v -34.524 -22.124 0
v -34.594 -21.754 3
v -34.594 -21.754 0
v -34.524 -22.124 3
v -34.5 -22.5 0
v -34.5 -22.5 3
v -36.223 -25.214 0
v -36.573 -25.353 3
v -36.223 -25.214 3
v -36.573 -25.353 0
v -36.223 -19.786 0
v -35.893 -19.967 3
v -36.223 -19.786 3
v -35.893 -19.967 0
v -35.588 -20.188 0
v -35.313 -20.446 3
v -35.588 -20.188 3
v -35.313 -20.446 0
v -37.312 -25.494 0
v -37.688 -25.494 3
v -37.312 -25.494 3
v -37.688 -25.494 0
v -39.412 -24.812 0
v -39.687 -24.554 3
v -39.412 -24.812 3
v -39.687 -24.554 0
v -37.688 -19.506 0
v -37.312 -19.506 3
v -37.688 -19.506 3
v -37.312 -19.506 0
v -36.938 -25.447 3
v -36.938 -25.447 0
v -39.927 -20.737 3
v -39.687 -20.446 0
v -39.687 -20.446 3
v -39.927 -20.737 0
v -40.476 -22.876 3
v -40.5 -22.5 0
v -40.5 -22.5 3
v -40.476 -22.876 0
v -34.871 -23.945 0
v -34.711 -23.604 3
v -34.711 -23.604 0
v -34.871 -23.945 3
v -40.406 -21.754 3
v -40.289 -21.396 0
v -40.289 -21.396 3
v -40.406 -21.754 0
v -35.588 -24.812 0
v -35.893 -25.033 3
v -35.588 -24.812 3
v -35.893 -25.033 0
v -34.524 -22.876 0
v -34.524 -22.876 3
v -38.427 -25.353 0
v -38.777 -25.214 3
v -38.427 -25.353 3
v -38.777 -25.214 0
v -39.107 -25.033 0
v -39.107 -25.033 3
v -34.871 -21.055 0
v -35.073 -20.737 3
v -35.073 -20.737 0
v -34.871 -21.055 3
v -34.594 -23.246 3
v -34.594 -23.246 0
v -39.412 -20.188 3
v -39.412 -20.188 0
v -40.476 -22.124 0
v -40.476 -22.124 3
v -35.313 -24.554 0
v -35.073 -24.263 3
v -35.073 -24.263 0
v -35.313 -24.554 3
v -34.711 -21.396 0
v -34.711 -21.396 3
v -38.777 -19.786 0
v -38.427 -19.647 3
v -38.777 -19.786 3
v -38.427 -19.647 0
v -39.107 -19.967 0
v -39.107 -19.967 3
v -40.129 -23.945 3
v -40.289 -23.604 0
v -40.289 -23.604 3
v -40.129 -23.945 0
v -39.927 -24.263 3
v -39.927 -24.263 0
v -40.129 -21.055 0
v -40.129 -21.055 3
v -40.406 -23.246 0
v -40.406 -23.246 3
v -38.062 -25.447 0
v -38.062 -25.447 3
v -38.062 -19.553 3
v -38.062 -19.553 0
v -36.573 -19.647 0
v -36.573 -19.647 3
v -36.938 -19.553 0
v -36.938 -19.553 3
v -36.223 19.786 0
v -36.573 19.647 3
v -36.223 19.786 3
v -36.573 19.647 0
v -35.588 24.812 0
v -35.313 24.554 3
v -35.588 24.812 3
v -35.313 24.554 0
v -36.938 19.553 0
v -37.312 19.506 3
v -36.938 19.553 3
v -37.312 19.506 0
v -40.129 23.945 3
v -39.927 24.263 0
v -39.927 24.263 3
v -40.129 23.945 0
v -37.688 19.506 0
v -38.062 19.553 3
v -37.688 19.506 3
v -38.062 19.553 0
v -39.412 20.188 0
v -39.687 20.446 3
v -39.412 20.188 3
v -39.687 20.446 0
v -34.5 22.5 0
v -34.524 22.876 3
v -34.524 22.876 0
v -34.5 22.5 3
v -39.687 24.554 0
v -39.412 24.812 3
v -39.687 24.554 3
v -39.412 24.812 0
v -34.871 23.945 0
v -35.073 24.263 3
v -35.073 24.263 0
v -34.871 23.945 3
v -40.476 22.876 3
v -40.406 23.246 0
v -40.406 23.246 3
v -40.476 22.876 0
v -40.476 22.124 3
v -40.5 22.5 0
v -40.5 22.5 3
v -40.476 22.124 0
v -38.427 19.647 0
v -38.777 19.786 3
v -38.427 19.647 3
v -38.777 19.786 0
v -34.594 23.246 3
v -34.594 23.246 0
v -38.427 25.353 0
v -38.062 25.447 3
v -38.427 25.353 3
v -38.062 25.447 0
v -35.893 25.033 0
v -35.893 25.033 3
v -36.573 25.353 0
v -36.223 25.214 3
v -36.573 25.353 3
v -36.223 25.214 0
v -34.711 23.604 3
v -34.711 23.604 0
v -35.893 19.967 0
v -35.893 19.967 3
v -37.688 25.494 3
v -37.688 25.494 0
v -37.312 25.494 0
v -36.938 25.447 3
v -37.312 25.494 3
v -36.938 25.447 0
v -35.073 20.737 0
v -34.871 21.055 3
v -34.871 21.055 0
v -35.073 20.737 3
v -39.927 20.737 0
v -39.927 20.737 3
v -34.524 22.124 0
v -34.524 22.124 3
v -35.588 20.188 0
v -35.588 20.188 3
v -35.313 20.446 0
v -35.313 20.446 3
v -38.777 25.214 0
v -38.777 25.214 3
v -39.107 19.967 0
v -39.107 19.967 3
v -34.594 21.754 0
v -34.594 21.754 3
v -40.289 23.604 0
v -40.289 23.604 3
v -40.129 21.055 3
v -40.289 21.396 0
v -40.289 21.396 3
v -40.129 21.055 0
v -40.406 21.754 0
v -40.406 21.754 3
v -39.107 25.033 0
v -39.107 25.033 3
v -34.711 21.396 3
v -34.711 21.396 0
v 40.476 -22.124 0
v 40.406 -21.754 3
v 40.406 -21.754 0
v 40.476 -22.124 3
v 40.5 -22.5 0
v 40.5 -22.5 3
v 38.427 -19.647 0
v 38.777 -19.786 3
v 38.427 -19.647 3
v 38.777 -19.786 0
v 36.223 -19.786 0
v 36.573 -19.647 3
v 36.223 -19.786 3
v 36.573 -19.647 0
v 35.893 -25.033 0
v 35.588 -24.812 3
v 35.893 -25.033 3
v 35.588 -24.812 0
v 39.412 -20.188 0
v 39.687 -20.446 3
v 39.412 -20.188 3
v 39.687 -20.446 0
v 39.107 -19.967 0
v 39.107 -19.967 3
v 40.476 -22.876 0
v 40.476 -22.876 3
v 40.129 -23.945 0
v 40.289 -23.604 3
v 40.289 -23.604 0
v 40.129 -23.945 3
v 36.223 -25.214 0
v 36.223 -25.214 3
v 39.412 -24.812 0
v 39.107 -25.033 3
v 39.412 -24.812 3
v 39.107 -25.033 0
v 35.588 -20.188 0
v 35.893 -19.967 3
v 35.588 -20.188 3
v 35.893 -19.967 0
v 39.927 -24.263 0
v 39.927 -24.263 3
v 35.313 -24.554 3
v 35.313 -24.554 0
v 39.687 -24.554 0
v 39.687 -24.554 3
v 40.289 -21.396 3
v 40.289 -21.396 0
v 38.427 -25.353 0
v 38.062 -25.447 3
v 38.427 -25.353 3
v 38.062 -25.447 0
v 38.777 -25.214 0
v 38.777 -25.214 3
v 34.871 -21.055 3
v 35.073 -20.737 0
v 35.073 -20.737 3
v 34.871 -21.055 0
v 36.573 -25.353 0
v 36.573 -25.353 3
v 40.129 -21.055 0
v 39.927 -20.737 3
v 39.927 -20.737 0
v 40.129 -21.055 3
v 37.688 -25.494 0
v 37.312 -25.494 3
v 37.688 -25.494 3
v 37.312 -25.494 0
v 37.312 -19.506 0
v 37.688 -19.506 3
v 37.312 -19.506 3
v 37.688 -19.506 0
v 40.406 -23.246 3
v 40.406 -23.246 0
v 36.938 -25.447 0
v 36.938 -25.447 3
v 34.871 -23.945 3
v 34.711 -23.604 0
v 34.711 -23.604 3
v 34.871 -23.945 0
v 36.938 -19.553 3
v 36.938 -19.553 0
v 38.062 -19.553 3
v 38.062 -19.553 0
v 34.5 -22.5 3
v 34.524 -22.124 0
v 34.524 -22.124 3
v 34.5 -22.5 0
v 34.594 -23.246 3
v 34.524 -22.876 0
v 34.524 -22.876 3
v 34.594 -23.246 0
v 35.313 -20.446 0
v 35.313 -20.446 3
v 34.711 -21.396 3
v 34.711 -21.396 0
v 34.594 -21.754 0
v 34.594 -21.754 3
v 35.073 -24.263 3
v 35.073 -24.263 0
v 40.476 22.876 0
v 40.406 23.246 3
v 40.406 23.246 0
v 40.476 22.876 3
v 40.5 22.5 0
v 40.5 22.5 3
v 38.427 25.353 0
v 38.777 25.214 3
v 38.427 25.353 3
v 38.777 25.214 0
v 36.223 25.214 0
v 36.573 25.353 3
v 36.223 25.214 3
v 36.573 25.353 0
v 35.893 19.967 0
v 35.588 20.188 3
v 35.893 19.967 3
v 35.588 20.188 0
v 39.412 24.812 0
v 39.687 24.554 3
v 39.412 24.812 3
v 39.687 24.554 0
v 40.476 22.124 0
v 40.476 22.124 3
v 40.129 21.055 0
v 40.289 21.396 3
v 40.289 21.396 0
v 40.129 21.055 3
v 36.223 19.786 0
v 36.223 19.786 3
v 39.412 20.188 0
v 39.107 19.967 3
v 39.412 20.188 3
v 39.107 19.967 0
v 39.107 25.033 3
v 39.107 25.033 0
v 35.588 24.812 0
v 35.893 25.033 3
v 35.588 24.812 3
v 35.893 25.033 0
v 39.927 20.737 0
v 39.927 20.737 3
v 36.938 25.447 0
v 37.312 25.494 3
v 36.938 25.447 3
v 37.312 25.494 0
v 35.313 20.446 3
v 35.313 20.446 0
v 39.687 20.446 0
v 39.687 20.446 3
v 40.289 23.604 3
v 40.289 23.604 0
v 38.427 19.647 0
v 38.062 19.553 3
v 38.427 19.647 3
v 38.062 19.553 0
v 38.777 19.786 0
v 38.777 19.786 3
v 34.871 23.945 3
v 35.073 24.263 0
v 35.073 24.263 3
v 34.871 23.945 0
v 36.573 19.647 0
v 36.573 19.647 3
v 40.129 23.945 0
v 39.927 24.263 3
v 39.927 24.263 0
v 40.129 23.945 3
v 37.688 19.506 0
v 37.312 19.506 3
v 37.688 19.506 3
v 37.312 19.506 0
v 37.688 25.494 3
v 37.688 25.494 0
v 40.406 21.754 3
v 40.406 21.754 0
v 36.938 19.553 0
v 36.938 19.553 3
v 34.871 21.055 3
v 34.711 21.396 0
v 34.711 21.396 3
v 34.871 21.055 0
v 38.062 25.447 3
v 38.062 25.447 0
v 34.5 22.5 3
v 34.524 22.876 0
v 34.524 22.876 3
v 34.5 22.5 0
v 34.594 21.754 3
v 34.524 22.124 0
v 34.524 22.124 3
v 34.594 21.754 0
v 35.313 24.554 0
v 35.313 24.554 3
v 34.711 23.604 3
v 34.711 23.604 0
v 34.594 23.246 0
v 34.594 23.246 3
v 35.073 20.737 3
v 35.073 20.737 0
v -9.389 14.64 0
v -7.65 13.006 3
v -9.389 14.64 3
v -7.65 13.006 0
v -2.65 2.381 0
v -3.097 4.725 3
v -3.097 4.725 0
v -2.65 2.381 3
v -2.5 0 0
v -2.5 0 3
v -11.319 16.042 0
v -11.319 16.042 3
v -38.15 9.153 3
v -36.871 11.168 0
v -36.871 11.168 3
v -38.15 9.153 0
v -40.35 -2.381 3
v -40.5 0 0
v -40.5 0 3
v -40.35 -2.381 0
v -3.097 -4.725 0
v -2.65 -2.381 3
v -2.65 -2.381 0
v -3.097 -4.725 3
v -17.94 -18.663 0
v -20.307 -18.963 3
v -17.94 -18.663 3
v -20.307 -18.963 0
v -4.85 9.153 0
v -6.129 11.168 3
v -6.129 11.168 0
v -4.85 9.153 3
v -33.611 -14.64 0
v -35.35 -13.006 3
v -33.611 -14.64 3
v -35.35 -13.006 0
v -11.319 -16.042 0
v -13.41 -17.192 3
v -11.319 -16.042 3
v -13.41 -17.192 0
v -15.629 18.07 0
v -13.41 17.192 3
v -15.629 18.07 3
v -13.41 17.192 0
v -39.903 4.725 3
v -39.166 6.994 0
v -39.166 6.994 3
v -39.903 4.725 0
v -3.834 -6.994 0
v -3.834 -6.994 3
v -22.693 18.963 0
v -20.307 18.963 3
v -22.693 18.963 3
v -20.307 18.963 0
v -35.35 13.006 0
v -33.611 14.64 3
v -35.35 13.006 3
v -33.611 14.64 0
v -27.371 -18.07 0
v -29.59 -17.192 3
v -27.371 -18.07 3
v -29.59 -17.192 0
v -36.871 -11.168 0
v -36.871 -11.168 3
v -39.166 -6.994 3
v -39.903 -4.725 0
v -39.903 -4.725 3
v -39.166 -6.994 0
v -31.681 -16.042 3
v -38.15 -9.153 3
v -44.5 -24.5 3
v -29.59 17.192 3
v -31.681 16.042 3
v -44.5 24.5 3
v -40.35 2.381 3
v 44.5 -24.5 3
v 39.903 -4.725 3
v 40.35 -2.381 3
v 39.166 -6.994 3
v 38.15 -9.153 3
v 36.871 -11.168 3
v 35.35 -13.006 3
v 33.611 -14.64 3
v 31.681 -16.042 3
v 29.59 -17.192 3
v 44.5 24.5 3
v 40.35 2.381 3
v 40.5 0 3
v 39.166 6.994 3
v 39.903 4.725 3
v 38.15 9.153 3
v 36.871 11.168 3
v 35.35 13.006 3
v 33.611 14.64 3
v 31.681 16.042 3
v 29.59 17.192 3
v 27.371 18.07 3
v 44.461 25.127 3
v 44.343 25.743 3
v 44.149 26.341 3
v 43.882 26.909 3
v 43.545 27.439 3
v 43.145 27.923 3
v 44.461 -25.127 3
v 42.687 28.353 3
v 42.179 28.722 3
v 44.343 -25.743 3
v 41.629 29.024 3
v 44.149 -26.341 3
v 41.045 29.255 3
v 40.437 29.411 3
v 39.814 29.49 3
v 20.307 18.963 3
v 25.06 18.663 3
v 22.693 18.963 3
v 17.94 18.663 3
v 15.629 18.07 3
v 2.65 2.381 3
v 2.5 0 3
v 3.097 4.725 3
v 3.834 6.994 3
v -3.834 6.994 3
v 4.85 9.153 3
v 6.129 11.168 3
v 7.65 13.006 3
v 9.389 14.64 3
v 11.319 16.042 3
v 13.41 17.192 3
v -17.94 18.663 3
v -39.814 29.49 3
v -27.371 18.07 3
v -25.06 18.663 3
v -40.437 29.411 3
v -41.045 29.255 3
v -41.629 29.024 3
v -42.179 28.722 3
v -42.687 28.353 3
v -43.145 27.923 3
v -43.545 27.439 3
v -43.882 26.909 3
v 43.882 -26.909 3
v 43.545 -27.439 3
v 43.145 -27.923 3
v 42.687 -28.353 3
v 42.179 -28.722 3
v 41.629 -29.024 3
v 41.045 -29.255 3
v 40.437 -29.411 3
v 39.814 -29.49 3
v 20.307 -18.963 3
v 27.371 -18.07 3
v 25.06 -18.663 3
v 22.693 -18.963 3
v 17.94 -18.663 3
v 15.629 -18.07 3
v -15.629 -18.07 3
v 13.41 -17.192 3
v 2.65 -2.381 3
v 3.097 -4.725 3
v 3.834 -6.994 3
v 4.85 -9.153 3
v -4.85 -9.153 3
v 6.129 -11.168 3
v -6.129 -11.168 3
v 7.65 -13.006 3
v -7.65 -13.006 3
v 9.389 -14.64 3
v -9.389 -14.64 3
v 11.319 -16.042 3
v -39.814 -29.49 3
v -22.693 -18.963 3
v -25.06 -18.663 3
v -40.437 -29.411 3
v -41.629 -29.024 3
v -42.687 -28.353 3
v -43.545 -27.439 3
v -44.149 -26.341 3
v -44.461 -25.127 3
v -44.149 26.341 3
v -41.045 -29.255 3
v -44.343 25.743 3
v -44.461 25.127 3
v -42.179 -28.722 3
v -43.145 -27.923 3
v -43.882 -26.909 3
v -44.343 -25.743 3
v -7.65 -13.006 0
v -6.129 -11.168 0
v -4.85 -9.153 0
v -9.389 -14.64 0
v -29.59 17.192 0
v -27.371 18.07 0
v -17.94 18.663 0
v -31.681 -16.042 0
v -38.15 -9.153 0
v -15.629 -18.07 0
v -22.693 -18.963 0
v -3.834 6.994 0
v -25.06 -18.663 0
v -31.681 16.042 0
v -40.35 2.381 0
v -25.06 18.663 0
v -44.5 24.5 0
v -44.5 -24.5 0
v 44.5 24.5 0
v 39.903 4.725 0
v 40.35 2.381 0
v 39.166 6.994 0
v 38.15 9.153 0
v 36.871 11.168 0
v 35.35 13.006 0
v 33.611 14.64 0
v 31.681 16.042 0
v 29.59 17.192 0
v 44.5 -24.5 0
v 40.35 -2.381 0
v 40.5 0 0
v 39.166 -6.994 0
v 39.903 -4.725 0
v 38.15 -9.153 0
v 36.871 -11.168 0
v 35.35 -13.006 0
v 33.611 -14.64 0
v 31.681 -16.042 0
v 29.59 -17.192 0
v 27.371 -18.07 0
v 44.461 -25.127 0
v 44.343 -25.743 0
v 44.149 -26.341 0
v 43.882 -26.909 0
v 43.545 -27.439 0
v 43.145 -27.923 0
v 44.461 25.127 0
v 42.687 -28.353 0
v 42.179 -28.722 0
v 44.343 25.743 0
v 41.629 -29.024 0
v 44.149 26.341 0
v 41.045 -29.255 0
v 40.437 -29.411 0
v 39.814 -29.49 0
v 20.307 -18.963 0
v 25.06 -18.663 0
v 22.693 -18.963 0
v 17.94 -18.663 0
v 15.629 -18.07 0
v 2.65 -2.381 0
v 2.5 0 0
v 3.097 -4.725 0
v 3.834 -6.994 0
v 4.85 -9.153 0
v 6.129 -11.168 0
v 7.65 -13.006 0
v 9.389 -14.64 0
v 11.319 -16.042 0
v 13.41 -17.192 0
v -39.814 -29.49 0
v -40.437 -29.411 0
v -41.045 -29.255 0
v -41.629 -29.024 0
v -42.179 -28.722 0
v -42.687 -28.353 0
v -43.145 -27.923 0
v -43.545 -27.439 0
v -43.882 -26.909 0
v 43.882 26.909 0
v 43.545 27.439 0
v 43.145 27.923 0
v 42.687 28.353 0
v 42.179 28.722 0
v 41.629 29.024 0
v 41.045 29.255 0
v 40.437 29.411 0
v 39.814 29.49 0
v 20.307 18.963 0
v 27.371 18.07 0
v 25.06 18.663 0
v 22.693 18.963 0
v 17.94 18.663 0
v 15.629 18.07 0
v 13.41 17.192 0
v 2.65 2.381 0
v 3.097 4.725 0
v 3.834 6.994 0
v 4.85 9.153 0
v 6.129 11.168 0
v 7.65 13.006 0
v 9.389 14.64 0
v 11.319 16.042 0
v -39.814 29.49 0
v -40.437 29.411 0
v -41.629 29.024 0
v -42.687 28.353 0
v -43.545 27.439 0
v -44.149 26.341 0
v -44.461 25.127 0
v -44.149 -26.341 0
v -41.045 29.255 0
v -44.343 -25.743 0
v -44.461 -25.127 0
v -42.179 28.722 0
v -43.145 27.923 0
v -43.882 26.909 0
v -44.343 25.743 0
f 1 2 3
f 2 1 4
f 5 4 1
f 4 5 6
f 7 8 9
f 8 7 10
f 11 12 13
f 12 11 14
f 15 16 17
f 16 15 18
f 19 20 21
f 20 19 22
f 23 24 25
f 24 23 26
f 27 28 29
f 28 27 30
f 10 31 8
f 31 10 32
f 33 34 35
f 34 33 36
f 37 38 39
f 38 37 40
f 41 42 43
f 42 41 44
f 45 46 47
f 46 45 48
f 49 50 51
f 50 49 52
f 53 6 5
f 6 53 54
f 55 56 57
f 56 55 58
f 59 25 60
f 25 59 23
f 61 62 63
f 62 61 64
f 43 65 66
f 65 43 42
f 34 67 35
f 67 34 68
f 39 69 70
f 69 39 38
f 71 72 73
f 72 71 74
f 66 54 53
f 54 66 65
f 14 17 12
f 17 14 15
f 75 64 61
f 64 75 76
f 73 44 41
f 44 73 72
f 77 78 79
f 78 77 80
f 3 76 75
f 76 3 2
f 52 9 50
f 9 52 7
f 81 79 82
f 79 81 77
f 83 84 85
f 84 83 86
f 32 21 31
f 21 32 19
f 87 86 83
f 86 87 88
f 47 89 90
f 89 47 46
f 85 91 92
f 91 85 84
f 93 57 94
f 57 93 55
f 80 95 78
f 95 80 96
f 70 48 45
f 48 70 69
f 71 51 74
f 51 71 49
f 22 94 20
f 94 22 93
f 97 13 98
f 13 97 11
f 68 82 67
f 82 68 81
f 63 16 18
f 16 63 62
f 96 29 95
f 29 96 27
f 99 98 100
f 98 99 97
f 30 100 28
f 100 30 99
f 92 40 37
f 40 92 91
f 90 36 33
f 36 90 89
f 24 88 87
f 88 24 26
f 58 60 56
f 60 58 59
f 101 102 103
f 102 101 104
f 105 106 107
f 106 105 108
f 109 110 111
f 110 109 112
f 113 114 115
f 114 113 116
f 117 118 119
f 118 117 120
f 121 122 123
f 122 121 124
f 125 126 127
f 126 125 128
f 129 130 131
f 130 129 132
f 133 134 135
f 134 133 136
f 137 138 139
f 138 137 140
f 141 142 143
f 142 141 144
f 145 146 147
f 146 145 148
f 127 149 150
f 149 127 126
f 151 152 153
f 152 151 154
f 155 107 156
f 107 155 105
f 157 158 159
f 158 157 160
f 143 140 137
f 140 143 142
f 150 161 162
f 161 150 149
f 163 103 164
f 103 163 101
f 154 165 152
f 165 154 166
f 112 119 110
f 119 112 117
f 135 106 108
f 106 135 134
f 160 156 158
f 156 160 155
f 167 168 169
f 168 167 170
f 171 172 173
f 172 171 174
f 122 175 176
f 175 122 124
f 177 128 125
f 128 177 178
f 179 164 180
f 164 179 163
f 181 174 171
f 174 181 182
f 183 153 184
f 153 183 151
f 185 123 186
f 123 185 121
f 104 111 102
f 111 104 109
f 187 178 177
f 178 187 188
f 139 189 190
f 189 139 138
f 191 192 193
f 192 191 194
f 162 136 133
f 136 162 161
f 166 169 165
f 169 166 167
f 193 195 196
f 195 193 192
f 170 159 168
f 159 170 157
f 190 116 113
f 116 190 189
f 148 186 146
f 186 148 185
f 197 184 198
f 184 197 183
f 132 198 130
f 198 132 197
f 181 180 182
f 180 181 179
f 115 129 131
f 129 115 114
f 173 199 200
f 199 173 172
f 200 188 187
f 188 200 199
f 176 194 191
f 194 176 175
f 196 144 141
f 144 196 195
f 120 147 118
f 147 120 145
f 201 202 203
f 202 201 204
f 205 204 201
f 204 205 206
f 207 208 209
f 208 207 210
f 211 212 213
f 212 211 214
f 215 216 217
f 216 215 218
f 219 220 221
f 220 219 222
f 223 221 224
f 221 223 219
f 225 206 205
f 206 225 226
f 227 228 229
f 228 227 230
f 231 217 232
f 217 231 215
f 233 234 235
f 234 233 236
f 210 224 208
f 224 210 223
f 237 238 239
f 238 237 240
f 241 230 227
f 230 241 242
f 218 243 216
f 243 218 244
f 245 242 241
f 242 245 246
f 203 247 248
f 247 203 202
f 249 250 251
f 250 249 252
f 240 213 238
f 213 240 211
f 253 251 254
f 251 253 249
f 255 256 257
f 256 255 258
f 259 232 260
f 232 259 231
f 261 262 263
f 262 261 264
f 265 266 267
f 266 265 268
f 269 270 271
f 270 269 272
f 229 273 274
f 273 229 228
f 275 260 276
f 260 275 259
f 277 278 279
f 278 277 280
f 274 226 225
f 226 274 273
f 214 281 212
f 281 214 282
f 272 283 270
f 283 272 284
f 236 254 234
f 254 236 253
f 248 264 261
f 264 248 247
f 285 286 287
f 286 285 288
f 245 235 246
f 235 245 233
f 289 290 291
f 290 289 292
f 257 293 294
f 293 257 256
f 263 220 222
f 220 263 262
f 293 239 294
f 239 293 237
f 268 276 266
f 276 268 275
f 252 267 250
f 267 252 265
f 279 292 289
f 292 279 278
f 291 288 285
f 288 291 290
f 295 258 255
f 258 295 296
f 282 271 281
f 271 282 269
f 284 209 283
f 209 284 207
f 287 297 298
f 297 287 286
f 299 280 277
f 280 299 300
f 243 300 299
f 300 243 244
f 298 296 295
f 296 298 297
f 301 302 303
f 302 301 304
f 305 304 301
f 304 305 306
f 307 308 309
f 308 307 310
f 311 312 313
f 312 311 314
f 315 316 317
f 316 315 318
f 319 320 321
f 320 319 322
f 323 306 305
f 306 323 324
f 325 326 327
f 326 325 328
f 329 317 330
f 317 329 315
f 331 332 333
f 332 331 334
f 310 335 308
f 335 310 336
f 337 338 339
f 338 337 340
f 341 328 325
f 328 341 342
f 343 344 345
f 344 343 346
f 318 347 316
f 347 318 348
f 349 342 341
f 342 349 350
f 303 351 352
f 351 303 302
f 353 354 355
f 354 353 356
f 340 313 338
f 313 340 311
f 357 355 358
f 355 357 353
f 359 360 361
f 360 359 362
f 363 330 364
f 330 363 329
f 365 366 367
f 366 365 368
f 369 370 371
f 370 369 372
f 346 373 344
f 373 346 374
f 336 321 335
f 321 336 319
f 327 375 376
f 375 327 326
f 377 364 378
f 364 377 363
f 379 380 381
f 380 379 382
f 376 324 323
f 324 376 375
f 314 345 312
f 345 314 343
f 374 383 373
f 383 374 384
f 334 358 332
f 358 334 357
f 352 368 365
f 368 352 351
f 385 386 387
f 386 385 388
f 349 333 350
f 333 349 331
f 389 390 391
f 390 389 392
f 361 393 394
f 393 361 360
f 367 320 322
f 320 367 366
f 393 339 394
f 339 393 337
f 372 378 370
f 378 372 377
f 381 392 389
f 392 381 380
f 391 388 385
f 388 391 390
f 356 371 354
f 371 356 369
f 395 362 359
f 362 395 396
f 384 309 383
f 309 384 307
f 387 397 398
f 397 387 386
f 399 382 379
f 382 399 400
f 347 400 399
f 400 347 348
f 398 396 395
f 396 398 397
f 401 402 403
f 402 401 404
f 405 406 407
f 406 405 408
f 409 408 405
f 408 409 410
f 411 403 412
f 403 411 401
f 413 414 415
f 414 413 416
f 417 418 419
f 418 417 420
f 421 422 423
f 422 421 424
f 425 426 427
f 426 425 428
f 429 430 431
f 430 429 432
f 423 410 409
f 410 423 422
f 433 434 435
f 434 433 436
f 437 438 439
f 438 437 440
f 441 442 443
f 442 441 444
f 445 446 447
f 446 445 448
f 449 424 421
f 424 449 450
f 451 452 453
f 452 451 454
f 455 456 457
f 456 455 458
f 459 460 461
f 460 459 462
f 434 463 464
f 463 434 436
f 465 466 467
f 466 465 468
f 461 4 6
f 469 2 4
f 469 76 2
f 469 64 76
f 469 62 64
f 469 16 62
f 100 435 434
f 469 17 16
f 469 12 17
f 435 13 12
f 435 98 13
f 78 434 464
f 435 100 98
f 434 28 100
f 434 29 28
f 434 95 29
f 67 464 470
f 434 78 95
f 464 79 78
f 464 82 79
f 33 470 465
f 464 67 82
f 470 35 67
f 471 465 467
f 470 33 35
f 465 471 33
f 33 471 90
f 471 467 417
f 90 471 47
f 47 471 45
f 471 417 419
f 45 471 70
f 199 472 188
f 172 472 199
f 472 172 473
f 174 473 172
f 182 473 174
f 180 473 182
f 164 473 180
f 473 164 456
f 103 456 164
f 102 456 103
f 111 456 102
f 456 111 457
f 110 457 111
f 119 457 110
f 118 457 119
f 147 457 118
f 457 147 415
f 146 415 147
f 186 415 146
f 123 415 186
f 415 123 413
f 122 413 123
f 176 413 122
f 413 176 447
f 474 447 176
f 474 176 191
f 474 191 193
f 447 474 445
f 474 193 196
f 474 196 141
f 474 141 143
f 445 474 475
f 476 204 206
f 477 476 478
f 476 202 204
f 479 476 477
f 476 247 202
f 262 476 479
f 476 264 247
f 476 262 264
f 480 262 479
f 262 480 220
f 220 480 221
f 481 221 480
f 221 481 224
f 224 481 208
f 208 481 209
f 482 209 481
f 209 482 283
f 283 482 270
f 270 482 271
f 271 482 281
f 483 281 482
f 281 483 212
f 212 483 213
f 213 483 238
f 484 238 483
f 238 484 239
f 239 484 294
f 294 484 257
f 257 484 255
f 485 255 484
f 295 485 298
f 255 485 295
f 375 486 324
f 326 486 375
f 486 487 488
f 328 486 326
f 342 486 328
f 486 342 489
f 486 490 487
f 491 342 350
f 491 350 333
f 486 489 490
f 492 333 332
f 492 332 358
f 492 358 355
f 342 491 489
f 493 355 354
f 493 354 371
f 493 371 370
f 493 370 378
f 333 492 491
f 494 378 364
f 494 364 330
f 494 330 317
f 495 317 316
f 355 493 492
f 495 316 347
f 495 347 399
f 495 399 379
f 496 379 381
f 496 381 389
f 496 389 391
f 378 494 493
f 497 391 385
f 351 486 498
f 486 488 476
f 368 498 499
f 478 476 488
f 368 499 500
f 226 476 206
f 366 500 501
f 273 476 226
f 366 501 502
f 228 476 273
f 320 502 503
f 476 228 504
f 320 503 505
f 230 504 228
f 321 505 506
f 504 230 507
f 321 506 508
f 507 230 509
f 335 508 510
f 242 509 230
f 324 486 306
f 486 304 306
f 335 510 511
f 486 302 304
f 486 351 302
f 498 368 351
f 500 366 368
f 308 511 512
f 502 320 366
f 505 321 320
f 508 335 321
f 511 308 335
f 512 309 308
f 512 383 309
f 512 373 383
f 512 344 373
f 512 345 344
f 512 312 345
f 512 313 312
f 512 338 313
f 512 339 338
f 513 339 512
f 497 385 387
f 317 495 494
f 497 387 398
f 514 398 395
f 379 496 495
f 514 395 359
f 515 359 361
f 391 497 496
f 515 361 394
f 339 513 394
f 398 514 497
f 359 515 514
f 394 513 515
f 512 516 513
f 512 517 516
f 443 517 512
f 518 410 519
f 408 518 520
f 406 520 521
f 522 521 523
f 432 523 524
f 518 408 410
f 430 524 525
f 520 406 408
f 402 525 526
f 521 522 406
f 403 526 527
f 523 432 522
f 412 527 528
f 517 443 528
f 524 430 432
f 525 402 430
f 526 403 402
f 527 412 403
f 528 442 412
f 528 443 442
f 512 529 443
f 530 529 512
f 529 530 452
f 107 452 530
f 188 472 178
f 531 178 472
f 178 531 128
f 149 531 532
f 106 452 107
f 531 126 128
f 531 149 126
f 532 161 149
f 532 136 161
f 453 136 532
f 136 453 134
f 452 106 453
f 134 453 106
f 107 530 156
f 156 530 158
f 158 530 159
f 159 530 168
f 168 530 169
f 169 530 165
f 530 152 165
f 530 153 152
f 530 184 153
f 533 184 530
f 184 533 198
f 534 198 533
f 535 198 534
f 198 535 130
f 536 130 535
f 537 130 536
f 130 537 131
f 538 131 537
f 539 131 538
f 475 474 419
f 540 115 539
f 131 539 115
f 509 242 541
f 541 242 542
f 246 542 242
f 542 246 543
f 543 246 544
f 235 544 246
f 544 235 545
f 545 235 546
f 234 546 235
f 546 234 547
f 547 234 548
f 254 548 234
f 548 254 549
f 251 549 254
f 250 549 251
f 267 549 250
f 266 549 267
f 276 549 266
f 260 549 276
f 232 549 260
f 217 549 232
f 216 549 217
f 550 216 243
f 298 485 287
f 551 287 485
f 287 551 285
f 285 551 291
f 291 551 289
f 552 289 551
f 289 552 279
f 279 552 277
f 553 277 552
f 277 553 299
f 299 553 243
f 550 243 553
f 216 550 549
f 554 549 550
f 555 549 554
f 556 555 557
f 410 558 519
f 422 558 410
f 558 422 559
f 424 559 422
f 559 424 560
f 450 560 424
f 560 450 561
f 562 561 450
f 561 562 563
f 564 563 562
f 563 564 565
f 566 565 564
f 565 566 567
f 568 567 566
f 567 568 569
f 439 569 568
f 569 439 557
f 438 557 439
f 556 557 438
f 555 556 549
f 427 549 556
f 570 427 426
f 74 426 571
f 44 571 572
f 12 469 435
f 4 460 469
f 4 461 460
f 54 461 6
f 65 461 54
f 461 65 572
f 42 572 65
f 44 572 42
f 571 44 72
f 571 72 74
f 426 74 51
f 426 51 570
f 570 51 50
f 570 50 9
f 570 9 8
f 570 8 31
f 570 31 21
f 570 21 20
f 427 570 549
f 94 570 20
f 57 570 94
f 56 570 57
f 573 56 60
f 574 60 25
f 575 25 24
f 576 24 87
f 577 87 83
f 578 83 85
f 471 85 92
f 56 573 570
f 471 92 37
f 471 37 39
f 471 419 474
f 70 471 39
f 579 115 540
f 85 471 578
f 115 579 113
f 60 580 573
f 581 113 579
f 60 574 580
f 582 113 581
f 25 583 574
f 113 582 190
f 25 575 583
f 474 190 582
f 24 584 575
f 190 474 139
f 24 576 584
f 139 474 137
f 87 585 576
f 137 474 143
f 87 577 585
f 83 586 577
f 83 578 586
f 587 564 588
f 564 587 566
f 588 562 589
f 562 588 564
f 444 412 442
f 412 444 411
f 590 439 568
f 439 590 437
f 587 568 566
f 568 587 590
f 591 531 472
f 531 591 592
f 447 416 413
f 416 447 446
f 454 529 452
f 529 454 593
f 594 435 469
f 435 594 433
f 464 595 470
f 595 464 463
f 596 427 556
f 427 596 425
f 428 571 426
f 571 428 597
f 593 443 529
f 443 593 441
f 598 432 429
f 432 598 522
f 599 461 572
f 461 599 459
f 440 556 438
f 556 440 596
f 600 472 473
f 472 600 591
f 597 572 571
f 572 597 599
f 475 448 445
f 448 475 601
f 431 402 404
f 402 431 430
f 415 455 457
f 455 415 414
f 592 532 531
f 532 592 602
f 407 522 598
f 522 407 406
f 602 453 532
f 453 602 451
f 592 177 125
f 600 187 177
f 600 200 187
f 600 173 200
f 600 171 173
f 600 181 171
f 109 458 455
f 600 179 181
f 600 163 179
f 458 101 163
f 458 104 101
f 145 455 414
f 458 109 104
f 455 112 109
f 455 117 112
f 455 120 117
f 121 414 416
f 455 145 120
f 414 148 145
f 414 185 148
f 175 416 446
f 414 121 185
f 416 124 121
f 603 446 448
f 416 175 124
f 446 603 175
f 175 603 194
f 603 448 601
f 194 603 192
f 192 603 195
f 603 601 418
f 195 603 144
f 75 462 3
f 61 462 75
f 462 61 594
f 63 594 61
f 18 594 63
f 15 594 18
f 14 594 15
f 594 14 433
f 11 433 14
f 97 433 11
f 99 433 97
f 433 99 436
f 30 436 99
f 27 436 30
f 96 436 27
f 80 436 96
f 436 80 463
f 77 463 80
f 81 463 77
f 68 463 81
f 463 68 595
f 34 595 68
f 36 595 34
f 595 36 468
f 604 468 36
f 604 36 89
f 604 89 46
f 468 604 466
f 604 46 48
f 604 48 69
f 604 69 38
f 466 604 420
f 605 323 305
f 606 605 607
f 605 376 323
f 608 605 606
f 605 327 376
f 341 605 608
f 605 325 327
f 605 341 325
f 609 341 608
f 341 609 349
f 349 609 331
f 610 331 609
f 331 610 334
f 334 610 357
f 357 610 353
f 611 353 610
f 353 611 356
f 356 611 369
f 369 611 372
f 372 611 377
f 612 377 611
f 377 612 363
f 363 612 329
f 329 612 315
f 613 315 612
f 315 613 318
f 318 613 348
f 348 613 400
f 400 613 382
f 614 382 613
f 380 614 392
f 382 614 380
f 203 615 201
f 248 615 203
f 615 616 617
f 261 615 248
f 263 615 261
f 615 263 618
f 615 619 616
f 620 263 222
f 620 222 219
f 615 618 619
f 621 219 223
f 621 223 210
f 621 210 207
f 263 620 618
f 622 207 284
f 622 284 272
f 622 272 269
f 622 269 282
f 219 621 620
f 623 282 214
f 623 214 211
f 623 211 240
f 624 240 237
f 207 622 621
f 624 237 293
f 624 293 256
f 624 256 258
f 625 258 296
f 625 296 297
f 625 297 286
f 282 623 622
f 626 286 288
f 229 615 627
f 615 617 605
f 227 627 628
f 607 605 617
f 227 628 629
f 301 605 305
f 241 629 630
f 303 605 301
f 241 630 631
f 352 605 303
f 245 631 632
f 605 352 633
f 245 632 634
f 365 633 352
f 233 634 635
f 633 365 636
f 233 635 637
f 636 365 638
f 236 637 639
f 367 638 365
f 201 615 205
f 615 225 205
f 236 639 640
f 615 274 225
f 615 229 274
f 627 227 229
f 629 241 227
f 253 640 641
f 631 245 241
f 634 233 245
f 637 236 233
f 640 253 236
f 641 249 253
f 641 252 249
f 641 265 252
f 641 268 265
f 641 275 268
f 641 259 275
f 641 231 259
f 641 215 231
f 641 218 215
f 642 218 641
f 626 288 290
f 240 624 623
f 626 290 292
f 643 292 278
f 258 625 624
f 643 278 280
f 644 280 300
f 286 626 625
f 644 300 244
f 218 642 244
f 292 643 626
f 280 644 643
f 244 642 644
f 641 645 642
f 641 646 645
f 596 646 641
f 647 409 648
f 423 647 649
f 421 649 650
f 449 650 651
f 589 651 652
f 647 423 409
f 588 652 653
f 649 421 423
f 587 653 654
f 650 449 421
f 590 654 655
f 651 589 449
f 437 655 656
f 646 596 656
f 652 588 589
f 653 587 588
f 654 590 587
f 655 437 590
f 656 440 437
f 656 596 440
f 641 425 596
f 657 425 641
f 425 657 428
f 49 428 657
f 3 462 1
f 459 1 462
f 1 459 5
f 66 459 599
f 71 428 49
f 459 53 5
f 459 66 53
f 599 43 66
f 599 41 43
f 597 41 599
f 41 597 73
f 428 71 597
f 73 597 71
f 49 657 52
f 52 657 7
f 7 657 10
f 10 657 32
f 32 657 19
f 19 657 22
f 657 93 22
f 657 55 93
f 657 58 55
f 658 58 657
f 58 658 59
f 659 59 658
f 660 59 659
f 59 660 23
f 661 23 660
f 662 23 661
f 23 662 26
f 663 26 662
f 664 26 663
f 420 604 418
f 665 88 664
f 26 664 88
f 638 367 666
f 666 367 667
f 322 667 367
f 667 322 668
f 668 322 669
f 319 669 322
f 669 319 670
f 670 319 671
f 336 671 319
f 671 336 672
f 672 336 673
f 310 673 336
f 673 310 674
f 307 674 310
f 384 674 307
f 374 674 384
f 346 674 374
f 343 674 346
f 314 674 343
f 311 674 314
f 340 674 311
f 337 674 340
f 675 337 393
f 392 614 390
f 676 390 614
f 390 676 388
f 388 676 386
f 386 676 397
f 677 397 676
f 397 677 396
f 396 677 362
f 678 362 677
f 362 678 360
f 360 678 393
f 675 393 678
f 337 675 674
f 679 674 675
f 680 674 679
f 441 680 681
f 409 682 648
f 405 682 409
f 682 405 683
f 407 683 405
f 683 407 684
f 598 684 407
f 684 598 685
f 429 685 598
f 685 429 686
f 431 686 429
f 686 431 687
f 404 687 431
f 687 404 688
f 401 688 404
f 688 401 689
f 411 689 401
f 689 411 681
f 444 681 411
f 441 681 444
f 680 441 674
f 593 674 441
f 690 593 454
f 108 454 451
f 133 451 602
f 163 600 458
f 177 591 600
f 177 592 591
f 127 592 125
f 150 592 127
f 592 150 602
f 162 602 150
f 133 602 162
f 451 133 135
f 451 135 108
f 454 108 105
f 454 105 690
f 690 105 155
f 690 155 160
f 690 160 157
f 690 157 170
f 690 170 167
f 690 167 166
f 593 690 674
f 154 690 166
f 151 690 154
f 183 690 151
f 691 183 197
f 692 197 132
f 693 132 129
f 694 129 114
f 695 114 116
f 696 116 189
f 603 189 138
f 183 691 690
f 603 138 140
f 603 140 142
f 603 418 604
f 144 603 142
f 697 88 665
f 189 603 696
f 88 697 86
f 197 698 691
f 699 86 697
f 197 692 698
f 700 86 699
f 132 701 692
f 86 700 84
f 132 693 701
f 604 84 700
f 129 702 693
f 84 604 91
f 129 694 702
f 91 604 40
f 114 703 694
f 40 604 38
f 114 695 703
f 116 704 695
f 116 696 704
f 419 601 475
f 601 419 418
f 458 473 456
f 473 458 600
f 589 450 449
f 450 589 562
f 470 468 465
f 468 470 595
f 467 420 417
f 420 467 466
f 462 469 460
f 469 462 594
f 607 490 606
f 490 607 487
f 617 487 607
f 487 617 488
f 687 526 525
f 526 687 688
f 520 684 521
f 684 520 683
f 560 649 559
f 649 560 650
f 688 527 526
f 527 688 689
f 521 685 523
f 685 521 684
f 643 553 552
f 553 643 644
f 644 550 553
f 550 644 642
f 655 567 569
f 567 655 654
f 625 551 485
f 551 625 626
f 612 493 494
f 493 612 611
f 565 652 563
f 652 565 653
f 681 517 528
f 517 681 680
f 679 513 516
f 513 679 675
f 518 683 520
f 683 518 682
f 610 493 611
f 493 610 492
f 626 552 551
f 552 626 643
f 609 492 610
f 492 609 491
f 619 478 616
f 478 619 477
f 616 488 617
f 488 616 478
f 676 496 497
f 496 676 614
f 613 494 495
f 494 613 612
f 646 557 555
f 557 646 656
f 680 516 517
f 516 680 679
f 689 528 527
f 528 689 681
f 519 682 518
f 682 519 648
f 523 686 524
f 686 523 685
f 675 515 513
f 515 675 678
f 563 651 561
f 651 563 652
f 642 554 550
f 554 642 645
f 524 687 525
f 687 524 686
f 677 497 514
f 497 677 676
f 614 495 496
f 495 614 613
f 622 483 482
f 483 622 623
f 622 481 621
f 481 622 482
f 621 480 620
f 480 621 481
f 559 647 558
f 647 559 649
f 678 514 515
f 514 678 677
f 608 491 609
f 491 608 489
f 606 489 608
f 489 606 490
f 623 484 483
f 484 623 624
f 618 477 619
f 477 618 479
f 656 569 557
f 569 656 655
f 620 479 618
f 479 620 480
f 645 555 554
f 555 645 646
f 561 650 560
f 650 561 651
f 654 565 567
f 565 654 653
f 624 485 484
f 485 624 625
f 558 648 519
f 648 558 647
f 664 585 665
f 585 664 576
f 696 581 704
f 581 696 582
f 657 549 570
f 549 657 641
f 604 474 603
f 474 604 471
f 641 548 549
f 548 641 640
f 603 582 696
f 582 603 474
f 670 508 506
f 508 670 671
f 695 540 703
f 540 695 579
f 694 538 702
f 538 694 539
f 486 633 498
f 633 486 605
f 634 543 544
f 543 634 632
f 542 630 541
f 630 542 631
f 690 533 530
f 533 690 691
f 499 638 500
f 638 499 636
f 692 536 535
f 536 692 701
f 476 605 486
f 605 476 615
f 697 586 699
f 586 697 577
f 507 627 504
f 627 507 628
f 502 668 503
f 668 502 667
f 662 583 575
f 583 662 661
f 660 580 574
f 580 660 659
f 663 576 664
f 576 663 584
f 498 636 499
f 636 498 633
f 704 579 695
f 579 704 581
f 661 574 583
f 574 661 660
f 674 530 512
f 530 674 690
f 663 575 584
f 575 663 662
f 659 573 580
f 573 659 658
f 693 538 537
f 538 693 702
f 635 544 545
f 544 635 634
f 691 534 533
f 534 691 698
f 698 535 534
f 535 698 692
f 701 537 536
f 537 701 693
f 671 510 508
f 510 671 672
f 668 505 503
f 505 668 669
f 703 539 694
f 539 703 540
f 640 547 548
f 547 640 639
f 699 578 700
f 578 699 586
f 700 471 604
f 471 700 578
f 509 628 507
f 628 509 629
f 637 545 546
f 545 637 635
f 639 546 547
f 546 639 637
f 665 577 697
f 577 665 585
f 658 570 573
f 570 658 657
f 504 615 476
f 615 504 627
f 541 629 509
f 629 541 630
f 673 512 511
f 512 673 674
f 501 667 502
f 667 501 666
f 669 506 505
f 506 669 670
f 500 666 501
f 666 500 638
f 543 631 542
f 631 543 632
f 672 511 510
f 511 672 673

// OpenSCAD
$fn = 50;


difference() {
	union() {
		hull() {
			translate(v = [-39.5000000000, 24.5000000000, 0]) {
				cylinder(h = 3, r = 5);
			}
			translate(v = [39.5000000000, 24.5000000000, 0]) {
				cylinder(h = 3, r = 5);
			}
			translate(v = [-39.5000000000, -24.5000000000, 0]) {
				cylinder(h = 3, r = 5);
			}
			translate(v = [39.5000000000, -24.5000000000, 0]) {
				cylinder(h = 3, r = 5);
			}
		}
	}
	union() {
		#translate(v = [-37.5000000000, -22.5000000000, -100.0000000000]) {
			cylinder(h = 200, r = 3.0000000000);
		}
		#translate(v = [-37.5000000000, 22.5000000000, -100.0000000000]) {
			cylinder(h = 200, r = 3.0000000000);
		}
		#translate(v = [37.5000000000, -22.5000000000, -100.0000000000]) {
			cylinder(h = 200, r = 3.0000000000);
		}
		#translate(v = [37.5000000000, 22.5000000000, -100.0000000000]) {
			cylinder(h = 200, r = 3.0000000000);
		}
		#translate(v = [-21.5000000000, 0, 0]) {
			cylinder(h = 3, r = 19.0000000000);
		}
		#translate(v = [21.5000000000, 0, 0]) {
			cylinder(h = 3, r = 19.0000000000);
		}
	}
}
